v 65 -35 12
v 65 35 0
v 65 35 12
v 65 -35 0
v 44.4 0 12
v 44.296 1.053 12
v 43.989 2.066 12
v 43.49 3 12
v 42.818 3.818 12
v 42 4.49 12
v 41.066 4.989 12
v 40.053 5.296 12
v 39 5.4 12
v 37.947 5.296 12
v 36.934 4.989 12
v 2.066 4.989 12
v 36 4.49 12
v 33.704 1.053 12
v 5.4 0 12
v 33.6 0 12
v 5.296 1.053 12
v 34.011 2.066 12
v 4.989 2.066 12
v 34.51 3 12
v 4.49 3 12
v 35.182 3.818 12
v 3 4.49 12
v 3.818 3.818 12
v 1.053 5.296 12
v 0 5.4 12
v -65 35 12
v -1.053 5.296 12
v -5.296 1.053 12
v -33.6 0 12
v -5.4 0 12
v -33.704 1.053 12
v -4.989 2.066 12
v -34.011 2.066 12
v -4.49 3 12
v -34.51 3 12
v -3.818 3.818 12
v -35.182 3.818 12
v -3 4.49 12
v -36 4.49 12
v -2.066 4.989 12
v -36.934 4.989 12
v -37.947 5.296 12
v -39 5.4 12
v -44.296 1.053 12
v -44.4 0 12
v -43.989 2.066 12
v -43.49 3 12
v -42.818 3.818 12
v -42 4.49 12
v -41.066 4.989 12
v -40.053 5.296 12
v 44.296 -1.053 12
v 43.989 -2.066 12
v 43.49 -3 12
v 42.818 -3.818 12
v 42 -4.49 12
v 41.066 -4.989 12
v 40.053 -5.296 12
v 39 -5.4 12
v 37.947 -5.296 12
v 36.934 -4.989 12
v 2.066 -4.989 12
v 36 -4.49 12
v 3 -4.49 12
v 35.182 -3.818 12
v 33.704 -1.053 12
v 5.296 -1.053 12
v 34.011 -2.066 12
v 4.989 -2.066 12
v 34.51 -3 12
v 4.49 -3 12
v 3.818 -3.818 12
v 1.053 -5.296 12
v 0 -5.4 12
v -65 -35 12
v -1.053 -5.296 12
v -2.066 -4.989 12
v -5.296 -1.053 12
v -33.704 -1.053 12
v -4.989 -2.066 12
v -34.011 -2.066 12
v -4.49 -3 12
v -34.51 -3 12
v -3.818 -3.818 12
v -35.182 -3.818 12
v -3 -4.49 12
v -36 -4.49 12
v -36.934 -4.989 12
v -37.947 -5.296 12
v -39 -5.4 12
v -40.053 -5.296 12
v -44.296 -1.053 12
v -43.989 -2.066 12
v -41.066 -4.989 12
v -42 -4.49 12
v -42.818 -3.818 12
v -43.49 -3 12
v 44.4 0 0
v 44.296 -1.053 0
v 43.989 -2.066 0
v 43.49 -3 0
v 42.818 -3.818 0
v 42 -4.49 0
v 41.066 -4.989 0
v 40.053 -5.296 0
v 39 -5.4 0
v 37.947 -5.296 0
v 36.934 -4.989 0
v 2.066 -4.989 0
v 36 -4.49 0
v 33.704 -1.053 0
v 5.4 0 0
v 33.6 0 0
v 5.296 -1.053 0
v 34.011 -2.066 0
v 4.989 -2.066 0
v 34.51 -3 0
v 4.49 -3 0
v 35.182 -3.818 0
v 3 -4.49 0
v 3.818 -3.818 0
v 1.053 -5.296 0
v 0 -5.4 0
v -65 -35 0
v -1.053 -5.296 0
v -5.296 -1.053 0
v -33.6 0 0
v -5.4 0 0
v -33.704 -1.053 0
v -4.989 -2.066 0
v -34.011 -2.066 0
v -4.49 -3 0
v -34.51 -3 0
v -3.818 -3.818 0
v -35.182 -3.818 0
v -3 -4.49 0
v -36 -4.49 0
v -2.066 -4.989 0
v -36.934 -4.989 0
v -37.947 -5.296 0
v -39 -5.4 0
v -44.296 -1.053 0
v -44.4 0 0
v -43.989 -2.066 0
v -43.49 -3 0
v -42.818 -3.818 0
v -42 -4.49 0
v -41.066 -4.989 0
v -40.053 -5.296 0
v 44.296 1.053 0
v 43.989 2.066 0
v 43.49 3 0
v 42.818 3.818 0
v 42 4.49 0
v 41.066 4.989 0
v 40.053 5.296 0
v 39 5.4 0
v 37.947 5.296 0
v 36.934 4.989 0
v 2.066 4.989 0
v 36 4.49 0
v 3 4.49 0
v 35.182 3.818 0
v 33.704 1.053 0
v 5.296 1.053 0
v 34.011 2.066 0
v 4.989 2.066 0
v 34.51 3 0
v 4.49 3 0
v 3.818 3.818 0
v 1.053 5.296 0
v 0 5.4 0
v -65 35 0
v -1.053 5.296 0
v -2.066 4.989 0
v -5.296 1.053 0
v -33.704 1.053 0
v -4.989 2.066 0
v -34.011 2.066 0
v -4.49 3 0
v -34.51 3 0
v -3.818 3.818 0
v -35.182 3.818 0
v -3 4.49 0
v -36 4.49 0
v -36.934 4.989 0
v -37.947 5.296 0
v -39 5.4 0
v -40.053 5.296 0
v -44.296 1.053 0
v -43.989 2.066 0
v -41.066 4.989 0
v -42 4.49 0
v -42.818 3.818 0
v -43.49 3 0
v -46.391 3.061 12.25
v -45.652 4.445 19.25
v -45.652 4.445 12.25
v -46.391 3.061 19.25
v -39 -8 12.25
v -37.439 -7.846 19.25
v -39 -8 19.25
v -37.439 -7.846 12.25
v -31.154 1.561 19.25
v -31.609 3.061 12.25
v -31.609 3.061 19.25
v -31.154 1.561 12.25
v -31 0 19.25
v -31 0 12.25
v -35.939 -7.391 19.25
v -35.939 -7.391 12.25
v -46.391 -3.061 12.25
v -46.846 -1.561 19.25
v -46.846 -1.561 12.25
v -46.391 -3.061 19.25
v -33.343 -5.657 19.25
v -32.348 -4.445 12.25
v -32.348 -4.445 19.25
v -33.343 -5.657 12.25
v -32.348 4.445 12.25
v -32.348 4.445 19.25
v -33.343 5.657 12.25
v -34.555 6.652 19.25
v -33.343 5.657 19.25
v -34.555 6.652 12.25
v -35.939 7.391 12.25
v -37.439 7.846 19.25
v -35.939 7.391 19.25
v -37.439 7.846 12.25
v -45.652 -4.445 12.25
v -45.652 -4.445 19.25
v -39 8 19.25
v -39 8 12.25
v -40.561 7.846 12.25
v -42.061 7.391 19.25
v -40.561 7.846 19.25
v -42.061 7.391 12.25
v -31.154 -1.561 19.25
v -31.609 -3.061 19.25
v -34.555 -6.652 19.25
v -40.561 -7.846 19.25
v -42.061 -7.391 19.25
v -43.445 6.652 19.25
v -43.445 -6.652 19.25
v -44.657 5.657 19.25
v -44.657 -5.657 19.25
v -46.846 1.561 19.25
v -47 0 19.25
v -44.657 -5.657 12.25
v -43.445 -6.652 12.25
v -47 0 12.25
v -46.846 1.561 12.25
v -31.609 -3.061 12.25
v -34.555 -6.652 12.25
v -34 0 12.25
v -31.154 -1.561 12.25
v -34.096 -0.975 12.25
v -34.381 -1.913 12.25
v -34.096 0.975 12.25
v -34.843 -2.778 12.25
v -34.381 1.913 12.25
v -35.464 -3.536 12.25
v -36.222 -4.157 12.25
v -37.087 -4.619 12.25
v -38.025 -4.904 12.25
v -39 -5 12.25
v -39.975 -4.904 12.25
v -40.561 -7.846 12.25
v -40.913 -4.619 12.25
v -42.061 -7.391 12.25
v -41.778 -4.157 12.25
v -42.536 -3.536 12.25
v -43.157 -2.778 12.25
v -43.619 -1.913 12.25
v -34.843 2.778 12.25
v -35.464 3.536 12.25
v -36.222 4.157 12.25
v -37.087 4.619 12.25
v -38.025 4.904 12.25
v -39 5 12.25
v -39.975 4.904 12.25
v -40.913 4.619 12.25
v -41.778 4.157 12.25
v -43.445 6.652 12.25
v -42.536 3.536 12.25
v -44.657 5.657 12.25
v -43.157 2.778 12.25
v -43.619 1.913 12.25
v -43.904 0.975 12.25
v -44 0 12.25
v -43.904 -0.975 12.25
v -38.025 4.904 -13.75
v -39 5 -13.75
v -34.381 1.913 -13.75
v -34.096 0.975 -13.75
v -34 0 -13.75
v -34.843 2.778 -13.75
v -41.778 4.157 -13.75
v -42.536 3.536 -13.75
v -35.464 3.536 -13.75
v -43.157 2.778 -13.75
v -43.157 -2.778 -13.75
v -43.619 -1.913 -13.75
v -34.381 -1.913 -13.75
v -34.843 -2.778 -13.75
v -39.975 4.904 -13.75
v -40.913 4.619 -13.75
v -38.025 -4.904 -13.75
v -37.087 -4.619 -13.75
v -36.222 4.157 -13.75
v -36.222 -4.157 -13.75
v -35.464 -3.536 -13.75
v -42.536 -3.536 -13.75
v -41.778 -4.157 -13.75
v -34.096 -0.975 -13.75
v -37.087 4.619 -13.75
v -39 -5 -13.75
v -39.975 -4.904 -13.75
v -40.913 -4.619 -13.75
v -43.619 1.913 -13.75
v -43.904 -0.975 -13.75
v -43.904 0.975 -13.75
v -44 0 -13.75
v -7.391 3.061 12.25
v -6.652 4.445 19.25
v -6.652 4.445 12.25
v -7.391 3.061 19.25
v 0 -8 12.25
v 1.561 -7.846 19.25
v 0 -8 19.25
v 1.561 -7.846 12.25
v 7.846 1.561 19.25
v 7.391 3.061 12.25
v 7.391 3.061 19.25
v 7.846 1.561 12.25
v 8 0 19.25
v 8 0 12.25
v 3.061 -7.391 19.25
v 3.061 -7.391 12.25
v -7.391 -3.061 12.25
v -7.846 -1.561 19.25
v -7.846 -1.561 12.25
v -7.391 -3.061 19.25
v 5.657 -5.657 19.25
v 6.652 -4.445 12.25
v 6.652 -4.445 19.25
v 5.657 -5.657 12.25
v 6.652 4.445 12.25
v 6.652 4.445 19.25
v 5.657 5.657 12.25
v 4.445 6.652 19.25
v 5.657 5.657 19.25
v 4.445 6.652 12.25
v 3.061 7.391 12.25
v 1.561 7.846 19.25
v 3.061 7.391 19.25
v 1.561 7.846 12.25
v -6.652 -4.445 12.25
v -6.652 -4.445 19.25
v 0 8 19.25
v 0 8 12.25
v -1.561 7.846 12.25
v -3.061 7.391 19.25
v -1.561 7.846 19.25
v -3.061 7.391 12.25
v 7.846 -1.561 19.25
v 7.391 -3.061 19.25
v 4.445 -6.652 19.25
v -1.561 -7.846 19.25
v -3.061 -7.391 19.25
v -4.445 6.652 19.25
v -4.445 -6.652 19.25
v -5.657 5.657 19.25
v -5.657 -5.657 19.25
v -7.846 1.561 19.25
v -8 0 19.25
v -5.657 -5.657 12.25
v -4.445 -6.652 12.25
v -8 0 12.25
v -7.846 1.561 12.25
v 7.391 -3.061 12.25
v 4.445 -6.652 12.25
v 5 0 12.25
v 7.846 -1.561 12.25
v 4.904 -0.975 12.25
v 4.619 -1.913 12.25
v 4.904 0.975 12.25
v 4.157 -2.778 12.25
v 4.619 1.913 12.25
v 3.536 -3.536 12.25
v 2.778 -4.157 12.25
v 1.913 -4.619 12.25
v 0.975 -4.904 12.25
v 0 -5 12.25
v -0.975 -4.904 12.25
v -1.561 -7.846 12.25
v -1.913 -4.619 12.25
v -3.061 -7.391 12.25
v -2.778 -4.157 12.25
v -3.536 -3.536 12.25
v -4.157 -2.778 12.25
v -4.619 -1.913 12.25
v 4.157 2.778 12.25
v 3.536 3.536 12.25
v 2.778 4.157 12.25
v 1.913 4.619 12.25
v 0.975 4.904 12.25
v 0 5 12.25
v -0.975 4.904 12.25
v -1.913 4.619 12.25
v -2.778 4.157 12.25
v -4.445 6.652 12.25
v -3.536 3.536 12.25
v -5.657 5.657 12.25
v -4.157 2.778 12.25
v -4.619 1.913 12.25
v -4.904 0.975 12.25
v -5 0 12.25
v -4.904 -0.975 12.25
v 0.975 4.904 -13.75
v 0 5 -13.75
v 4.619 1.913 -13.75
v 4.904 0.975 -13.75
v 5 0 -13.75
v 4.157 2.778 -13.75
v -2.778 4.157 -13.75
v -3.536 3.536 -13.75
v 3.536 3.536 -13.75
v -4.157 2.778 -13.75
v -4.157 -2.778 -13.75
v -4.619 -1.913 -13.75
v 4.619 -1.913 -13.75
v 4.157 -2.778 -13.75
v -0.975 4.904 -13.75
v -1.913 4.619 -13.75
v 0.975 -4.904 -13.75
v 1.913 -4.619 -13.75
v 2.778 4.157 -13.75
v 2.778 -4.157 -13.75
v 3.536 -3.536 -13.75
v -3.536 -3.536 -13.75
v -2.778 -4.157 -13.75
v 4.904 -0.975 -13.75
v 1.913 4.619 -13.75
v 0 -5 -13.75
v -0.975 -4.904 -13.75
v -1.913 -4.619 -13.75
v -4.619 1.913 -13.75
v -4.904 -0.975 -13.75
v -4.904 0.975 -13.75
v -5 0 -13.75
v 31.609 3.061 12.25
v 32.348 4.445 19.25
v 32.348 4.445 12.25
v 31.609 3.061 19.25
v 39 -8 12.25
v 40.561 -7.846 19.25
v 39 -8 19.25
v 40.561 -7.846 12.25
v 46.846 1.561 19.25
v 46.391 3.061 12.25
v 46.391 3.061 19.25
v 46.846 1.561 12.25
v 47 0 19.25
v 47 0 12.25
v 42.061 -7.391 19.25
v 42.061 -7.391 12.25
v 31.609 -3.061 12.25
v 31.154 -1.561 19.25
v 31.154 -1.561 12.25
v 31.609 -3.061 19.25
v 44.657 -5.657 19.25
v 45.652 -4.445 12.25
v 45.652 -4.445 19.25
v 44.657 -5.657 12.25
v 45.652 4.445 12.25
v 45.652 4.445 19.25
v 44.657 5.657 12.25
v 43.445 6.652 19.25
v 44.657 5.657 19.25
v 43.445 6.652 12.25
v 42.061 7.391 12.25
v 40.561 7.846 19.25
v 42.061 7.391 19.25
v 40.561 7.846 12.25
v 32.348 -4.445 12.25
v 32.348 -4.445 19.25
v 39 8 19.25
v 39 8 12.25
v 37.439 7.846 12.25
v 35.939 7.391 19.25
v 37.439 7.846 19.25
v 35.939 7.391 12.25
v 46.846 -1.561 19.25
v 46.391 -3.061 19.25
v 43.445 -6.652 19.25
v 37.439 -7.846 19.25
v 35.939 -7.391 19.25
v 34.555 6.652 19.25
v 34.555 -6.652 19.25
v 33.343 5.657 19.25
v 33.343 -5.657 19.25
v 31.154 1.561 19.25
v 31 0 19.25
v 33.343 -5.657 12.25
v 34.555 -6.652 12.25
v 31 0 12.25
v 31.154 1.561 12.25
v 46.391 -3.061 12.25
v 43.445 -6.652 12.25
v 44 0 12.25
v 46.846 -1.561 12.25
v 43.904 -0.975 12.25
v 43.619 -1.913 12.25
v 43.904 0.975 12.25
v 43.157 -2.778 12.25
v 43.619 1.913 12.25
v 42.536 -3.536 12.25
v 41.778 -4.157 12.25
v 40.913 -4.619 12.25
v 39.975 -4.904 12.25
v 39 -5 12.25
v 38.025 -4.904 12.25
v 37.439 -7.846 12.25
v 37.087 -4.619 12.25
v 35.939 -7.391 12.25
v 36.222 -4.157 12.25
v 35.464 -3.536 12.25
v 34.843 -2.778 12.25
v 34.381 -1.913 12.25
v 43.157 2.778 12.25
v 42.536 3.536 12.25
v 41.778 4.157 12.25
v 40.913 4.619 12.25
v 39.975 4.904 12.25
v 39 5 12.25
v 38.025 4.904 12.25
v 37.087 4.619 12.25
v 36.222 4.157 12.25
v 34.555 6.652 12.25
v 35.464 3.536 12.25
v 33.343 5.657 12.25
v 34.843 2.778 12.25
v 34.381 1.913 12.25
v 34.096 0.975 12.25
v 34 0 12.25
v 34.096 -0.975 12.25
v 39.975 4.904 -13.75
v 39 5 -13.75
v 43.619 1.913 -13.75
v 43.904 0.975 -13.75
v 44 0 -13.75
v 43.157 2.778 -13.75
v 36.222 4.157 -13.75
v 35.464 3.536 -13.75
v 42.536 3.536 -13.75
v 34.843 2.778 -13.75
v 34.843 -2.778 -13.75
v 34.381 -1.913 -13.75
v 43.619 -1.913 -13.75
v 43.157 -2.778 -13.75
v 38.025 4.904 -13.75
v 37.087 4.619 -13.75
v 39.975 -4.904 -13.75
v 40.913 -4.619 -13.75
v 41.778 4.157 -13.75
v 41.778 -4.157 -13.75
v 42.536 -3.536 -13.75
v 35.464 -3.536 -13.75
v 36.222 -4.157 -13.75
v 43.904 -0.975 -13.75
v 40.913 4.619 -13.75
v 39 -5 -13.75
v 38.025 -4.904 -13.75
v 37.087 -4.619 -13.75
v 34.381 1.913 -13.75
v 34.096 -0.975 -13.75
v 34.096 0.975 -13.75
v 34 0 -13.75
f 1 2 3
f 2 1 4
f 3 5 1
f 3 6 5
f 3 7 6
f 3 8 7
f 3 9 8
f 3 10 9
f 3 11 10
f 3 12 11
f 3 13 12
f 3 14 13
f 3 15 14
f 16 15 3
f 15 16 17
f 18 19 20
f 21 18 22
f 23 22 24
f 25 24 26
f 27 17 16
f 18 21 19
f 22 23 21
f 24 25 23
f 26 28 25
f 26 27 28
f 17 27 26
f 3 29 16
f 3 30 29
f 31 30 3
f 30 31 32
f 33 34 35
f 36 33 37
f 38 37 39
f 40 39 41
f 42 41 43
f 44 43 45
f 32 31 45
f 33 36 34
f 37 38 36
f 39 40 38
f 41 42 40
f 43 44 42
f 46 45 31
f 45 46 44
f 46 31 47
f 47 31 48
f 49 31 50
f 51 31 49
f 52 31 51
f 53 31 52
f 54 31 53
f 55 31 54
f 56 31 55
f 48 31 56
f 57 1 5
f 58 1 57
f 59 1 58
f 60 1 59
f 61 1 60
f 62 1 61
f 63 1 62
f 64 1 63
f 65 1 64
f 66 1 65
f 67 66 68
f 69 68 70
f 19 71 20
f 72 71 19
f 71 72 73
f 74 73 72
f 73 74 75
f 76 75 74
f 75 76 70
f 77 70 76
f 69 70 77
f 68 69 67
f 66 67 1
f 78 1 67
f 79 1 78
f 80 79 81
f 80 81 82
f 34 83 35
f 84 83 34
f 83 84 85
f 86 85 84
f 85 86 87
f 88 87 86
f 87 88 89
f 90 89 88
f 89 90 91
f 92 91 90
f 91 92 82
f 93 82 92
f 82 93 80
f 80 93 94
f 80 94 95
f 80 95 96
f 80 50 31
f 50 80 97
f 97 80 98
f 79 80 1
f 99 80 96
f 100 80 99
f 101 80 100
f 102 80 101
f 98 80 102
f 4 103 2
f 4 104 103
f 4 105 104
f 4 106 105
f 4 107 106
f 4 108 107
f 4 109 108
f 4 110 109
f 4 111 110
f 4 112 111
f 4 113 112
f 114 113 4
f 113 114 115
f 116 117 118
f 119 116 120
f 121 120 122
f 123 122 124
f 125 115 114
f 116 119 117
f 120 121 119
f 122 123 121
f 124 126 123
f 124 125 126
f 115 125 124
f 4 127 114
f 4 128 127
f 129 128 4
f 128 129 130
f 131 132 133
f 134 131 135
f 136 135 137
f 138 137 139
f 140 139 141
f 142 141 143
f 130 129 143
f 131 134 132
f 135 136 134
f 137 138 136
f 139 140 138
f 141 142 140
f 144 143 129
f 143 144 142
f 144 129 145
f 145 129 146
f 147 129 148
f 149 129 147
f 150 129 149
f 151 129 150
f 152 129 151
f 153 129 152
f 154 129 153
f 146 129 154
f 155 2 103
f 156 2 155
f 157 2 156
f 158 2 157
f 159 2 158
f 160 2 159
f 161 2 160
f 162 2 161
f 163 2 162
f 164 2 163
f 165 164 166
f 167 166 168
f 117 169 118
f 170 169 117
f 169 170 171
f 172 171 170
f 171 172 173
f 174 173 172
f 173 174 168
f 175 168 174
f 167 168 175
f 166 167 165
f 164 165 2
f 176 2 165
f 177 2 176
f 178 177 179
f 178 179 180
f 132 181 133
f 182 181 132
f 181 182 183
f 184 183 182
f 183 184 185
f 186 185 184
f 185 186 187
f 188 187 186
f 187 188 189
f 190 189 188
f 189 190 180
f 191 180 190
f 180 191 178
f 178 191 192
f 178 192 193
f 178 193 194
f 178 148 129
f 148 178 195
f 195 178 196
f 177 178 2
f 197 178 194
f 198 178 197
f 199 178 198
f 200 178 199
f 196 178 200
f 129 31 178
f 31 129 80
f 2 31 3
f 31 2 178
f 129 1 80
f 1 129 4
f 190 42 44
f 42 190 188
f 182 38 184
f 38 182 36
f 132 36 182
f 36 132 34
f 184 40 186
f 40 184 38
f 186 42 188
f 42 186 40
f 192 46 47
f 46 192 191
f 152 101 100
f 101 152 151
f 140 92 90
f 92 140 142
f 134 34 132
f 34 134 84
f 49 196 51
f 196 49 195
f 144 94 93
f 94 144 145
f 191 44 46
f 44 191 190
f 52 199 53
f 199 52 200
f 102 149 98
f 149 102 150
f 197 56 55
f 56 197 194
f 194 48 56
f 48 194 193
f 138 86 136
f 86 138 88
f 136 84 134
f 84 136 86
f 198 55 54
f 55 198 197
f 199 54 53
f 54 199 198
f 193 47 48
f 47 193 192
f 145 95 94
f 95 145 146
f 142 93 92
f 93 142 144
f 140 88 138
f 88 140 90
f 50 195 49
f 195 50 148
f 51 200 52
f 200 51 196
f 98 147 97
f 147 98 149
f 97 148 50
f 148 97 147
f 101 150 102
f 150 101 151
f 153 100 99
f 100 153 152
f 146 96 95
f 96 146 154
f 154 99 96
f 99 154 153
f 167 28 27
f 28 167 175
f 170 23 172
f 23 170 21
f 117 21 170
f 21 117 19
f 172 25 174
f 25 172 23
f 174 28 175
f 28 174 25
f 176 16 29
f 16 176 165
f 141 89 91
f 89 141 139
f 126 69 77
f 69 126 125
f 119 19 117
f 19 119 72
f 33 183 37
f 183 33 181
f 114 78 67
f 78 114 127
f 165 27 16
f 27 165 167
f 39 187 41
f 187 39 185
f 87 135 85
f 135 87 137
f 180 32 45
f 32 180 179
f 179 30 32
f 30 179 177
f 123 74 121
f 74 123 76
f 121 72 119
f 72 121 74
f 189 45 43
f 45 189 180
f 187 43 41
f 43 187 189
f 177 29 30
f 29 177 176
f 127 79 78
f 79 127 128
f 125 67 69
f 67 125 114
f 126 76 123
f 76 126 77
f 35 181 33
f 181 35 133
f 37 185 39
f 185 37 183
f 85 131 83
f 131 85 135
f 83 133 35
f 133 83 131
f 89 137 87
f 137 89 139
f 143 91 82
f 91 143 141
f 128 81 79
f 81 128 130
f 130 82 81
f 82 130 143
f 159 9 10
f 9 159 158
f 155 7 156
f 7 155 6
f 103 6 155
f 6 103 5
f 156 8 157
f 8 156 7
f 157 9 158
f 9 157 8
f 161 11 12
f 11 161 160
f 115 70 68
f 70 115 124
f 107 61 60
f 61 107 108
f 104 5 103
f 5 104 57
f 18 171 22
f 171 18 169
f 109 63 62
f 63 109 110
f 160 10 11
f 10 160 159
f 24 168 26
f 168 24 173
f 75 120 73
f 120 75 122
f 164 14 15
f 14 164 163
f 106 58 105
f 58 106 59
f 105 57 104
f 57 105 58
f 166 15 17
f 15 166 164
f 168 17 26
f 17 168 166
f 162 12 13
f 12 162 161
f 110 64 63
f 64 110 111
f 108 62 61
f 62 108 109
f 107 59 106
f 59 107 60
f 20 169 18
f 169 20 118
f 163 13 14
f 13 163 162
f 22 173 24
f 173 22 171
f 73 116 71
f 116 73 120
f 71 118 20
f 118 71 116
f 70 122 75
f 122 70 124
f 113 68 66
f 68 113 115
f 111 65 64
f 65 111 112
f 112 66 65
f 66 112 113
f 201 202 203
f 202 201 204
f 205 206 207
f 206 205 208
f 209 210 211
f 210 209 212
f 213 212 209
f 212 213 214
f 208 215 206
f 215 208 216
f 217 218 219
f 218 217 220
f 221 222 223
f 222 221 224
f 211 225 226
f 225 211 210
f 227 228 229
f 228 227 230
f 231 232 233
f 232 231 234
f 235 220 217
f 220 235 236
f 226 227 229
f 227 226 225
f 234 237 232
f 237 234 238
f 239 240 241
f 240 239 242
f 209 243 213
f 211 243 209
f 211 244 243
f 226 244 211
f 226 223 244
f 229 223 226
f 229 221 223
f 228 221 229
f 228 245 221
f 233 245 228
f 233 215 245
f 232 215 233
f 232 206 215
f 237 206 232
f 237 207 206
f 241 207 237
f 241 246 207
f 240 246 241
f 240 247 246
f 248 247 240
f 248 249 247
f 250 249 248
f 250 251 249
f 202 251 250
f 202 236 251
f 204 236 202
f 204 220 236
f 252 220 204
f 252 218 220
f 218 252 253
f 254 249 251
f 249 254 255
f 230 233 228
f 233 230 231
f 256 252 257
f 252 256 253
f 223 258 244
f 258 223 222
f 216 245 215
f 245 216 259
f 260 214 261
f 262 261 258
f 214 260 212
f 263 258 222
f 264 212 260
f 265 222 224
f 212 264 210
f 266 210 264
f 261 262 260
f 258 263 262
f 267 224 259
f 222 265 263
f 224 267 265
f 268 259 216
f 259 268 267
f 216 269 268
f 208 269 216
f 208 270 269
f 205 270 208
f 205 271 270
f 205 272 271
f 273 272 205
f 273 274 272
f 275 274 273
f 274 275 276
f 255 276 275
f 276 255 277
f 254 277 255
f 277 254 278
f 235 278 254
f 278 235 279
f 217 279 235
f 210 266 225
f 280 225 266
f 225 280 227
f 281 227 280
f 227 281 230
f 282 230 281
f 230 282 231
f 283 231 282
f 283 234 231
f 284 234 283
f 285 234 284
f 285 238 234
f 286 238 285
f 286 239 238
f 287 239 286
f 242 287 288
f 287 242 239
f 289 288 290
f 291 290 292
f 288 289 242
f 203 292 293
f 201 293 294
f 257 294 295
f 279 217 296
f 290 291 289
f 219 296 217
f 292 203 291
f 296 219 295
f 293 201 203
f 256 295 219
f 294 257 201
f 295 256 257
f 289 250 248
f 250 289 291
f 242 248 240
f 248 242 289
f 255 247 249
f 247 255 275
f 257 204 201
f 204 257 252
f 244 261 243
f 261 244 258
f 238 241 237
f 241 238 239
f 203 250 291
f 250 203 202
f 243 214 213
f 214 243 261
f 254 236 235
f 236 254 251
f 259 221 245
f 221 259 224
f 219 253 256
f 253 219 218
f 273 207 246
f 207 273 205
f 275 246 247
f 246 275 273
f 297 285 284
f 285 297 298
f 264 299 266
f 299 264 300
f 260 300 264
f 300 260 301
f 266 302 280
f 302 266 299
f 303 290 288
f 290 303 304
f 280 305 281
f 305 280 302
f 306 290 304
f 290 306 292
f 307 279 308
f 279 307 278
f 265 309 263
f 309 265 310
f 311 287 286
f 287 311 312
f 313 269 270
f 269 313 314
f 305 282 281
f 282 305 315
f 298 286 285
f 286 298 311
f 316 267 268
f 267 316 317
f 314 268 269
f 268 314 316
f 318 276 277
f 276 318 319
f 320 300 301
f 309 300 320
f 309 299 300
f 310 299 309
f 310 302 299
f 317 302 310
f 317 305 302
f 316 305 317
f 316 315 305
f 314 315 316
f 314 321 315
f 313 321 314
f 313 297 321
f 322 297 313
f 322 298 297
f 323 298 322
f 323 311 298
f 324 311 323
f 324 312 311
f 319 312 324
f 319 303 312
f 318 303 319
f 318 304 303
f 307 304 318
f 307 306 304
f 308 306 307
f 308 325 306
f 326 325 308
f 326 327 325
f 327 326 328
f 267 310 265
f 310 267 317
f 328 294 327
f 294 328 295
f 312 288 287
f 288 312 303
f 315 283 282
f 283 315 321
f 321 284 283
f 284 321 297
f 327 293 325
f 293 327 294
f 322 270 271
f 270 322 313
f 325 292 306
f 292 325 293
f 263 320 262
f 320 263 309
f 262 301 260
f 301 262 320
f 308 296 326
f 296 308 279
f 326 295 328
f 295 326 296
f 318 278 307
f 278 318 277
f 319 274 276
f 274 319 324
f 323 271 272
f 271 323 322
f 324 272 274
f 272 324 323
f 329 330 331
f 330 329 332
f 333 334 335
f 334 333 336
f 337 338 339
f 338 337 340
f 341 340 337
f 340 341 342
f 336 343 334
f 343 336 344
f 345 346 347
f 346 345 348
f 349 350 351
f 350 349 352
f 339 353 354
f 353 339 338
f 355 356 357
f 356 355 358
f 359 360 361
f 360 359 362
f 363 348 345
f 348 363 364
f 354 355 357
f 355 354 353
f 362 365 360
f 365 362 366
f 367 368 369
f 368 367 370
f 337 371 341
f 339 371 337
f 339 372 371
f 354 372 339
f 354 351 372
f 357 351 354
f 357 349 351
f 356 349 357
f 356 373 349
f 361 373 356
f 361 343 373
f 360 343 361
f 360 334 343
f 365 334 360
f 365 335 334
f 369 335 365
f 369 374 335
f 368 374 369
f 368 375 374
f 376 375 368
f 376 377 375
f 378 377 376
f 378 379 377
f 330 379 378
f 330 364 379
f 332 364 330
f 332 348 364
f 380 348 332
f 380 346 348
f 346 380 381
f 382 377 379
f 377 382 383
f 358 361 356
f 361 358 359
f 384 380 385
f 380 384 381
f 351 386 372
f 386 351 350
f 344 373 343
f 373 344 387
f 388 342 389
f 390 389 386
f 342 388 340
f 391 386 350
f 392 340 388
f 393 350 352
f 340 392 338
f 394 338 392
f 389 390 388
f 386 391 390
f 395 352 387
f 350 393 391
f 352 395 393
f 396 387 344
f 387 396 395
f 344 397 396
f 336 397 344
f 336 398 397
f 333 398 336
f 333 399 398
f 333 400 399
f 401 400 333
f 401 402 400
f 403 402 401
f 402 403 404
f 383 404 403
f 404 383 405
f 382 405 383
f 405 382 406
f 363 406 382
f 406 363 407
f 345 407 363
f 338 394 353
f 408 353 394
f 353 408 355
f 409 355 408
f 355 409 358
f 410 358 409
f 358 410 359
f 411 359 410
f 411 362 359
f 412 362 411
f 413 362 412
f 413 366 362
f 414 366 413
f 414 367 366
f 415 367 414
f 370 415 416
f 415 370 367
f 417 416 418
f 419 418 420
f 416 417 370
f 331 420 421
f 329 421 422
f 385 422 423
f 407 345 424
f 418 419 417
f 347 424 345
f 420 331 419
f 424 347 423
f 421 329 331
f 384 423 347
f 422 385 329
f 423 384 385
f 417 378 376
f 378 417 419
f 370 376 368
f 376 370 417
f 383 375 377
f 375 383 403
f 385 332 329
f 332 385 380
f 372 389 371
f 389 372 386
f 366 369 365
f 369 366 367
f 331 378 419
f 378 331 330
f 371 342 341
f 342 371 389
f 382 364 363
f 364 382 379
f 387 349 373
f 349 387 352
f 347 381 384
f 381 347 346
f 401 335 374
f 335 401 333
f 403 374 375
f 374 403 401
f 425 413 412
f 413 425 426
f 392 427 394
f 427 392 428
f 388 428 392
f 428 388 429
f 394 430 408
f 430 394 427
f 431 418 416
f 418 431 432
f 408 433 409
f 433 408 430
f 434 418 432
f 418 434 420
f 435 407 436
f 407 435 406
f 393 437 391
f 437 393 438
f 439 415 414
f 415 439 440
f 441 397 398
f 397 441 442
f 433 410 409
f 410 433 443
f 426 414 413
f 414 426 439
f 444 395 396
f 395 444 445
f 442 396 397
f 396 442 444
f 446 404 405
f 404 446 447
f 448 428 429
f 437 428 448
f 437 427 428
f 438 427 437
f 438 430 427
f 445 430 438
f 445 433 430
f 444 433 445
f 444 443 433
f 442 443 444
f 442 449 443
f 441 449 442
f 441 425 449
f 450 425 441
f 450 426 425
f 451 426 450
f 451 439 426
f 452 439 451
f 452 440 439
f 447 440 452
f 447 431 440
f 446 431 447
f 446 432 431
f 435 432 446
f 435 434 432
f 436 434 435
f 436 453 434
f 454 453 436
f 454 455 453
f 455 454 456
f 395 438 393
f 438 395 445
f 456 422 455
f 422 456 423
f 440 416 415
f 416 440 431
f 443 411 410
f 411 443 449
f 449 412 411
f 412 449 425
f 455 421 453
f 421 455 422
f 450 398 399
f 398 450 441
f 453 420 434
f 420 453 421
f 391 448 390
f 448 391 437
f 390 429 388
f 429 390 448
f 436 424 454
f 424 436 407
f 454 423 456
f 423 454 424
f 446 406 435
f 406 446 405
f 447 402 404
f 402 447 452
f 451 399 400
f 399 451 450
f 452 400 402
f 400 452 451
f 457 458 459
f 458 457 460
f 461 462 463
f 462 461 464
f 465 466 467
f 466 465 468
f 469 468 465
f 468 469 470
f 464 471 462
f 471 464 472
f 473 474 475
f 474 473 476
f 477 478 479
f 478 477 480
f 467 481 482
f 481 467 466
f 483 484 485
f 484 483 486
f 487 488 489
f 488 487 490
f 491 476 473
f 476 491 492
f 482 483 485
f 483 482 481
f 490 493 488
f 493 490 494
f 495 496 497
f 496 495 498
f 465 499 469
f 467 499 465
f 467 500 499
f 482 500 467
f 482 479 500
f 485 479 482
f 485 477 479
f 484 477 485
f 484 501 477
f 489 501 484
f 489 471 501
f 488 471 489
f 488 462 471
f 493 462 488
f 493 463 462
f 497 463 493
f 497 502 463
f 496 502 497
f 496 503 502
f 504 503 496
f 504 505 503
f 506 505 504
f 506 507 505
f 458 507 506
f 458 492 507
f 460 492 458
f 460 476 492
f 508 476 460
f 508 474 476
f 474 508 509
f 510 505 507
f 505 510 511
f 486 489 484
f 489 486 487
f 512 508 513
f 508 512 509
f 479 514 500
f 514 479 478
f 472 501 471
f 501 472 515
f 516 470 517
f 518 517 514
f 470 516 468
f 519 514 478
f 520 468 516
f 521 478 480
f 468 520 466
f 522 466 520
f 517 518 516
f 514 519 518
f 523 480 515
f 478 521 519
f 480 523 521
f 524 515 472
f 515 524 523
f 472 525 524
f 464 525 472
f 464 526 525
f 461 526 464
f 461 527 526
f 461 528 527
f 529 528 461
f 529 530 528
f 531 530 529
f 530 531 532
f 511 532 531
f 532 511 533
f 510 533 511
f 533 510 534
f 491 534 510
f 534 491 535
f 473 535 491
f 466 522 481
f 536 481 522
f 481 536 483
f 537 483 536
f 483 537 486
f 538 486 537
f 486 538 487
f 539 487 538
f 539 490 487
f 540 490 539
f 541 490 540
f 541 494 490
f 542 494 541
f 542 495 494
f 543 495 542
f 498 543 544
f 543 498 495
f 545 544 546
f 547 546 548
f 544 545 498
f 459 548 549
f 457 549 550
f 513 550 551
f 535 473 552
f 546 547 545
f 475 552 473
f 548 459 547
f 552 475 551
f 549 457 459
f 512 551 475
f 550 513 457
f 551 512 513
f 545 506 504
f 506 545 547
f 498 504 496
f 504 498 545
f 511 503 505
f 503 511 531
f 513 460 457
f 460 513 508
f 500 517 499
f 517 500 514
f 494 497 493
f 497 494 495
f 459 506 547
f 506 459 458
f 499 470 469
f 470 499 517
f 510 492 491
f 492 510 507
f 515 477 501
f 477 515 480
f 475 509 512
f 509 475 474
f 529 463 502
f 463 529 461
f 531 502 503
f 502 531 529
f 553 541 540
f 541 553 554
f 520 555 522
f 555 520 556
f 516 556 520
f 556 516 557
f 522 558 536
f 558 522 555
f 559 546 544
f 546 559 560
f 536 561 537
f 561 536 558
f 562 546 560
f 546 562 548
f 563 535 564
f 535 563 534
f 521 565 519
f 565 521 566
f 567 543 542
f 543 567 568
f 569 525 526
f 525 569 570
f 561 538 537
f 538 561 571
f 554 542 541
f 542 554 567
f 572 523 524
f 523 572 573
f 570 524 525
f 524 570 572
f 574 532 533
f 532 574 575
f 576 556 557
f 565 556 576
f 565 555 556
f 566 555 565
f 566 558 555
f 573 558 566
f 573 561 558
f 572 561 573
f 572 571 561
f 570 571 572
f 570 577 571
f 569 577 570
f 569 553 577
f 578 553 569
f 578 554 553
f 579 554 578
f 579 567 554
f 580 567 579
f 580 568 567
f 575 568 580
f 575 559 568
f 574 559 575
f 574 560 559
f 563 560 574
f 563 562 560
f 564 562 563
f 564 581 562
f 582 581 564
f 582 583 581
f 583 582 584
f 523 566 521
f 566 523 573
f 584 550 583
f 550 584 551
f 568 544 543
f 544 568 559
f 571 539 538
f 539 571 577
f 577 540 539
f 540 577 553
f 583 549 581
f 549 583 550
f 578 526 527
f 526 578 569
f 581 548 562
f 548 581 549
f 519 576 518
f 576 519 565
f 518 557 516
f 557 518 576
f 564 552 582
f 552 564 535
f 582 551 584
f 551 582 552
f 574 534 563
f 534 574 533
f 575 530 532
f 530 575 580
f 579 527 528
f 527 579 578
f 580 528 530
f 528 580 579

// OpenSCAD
$fn = 32;

// ------------------------------------------------------------------------
// Bolted plate: 130 x 70 x 12 mm plate, 3 fasteners
// Every part is its own module, assembly() places them once.
// ------------------------------------------------------------------------

// --- part 1 ---
module plate() {
  difference() {
    translate([-65, -35, 0]) cube([130, 70, 12]);
    translate([-39, 0, -1]) cylinder(h = 14, d = 10.8);
    translate([0, 0, -1]) cylinder(h = 14, d = 10.8);
    translate([39, 0, -1]) cylinder(h = 14, d = 10.8);
  }
}

// --- part 2 ---
module bolt1() {
  cylinder(h = 7, d = 16);
  translate([0, 0, -26]) cylinder(h = 26, d = 10);
}

// --- part 3 ---
module bolt2() {
  cylinder(h = 7, d = 16);
  translate([0, 0, -26]) cylinder(h = 26, d = 10);
}

// --- part 4 ---
module bolt3() {
  cylinder(h = 7, d = 16);
  translate([0, 0, -26]) cylinder(h = 26, d = 10);
}

// --- assembly ---
module assembly() {
  translate([0, 0, 0]) rotate([0, 0, 0]) plate();
  translate([-39, 0, 12.25]) rotate([0, 0, 0]) bolt1();
  translate([0, 0, 12.25]) rotate([0, 0, 0]) bolt2();
  translate([39, 0, 12.25]) rotate([0, 0, 0]) bolt3();
}

assembly();
